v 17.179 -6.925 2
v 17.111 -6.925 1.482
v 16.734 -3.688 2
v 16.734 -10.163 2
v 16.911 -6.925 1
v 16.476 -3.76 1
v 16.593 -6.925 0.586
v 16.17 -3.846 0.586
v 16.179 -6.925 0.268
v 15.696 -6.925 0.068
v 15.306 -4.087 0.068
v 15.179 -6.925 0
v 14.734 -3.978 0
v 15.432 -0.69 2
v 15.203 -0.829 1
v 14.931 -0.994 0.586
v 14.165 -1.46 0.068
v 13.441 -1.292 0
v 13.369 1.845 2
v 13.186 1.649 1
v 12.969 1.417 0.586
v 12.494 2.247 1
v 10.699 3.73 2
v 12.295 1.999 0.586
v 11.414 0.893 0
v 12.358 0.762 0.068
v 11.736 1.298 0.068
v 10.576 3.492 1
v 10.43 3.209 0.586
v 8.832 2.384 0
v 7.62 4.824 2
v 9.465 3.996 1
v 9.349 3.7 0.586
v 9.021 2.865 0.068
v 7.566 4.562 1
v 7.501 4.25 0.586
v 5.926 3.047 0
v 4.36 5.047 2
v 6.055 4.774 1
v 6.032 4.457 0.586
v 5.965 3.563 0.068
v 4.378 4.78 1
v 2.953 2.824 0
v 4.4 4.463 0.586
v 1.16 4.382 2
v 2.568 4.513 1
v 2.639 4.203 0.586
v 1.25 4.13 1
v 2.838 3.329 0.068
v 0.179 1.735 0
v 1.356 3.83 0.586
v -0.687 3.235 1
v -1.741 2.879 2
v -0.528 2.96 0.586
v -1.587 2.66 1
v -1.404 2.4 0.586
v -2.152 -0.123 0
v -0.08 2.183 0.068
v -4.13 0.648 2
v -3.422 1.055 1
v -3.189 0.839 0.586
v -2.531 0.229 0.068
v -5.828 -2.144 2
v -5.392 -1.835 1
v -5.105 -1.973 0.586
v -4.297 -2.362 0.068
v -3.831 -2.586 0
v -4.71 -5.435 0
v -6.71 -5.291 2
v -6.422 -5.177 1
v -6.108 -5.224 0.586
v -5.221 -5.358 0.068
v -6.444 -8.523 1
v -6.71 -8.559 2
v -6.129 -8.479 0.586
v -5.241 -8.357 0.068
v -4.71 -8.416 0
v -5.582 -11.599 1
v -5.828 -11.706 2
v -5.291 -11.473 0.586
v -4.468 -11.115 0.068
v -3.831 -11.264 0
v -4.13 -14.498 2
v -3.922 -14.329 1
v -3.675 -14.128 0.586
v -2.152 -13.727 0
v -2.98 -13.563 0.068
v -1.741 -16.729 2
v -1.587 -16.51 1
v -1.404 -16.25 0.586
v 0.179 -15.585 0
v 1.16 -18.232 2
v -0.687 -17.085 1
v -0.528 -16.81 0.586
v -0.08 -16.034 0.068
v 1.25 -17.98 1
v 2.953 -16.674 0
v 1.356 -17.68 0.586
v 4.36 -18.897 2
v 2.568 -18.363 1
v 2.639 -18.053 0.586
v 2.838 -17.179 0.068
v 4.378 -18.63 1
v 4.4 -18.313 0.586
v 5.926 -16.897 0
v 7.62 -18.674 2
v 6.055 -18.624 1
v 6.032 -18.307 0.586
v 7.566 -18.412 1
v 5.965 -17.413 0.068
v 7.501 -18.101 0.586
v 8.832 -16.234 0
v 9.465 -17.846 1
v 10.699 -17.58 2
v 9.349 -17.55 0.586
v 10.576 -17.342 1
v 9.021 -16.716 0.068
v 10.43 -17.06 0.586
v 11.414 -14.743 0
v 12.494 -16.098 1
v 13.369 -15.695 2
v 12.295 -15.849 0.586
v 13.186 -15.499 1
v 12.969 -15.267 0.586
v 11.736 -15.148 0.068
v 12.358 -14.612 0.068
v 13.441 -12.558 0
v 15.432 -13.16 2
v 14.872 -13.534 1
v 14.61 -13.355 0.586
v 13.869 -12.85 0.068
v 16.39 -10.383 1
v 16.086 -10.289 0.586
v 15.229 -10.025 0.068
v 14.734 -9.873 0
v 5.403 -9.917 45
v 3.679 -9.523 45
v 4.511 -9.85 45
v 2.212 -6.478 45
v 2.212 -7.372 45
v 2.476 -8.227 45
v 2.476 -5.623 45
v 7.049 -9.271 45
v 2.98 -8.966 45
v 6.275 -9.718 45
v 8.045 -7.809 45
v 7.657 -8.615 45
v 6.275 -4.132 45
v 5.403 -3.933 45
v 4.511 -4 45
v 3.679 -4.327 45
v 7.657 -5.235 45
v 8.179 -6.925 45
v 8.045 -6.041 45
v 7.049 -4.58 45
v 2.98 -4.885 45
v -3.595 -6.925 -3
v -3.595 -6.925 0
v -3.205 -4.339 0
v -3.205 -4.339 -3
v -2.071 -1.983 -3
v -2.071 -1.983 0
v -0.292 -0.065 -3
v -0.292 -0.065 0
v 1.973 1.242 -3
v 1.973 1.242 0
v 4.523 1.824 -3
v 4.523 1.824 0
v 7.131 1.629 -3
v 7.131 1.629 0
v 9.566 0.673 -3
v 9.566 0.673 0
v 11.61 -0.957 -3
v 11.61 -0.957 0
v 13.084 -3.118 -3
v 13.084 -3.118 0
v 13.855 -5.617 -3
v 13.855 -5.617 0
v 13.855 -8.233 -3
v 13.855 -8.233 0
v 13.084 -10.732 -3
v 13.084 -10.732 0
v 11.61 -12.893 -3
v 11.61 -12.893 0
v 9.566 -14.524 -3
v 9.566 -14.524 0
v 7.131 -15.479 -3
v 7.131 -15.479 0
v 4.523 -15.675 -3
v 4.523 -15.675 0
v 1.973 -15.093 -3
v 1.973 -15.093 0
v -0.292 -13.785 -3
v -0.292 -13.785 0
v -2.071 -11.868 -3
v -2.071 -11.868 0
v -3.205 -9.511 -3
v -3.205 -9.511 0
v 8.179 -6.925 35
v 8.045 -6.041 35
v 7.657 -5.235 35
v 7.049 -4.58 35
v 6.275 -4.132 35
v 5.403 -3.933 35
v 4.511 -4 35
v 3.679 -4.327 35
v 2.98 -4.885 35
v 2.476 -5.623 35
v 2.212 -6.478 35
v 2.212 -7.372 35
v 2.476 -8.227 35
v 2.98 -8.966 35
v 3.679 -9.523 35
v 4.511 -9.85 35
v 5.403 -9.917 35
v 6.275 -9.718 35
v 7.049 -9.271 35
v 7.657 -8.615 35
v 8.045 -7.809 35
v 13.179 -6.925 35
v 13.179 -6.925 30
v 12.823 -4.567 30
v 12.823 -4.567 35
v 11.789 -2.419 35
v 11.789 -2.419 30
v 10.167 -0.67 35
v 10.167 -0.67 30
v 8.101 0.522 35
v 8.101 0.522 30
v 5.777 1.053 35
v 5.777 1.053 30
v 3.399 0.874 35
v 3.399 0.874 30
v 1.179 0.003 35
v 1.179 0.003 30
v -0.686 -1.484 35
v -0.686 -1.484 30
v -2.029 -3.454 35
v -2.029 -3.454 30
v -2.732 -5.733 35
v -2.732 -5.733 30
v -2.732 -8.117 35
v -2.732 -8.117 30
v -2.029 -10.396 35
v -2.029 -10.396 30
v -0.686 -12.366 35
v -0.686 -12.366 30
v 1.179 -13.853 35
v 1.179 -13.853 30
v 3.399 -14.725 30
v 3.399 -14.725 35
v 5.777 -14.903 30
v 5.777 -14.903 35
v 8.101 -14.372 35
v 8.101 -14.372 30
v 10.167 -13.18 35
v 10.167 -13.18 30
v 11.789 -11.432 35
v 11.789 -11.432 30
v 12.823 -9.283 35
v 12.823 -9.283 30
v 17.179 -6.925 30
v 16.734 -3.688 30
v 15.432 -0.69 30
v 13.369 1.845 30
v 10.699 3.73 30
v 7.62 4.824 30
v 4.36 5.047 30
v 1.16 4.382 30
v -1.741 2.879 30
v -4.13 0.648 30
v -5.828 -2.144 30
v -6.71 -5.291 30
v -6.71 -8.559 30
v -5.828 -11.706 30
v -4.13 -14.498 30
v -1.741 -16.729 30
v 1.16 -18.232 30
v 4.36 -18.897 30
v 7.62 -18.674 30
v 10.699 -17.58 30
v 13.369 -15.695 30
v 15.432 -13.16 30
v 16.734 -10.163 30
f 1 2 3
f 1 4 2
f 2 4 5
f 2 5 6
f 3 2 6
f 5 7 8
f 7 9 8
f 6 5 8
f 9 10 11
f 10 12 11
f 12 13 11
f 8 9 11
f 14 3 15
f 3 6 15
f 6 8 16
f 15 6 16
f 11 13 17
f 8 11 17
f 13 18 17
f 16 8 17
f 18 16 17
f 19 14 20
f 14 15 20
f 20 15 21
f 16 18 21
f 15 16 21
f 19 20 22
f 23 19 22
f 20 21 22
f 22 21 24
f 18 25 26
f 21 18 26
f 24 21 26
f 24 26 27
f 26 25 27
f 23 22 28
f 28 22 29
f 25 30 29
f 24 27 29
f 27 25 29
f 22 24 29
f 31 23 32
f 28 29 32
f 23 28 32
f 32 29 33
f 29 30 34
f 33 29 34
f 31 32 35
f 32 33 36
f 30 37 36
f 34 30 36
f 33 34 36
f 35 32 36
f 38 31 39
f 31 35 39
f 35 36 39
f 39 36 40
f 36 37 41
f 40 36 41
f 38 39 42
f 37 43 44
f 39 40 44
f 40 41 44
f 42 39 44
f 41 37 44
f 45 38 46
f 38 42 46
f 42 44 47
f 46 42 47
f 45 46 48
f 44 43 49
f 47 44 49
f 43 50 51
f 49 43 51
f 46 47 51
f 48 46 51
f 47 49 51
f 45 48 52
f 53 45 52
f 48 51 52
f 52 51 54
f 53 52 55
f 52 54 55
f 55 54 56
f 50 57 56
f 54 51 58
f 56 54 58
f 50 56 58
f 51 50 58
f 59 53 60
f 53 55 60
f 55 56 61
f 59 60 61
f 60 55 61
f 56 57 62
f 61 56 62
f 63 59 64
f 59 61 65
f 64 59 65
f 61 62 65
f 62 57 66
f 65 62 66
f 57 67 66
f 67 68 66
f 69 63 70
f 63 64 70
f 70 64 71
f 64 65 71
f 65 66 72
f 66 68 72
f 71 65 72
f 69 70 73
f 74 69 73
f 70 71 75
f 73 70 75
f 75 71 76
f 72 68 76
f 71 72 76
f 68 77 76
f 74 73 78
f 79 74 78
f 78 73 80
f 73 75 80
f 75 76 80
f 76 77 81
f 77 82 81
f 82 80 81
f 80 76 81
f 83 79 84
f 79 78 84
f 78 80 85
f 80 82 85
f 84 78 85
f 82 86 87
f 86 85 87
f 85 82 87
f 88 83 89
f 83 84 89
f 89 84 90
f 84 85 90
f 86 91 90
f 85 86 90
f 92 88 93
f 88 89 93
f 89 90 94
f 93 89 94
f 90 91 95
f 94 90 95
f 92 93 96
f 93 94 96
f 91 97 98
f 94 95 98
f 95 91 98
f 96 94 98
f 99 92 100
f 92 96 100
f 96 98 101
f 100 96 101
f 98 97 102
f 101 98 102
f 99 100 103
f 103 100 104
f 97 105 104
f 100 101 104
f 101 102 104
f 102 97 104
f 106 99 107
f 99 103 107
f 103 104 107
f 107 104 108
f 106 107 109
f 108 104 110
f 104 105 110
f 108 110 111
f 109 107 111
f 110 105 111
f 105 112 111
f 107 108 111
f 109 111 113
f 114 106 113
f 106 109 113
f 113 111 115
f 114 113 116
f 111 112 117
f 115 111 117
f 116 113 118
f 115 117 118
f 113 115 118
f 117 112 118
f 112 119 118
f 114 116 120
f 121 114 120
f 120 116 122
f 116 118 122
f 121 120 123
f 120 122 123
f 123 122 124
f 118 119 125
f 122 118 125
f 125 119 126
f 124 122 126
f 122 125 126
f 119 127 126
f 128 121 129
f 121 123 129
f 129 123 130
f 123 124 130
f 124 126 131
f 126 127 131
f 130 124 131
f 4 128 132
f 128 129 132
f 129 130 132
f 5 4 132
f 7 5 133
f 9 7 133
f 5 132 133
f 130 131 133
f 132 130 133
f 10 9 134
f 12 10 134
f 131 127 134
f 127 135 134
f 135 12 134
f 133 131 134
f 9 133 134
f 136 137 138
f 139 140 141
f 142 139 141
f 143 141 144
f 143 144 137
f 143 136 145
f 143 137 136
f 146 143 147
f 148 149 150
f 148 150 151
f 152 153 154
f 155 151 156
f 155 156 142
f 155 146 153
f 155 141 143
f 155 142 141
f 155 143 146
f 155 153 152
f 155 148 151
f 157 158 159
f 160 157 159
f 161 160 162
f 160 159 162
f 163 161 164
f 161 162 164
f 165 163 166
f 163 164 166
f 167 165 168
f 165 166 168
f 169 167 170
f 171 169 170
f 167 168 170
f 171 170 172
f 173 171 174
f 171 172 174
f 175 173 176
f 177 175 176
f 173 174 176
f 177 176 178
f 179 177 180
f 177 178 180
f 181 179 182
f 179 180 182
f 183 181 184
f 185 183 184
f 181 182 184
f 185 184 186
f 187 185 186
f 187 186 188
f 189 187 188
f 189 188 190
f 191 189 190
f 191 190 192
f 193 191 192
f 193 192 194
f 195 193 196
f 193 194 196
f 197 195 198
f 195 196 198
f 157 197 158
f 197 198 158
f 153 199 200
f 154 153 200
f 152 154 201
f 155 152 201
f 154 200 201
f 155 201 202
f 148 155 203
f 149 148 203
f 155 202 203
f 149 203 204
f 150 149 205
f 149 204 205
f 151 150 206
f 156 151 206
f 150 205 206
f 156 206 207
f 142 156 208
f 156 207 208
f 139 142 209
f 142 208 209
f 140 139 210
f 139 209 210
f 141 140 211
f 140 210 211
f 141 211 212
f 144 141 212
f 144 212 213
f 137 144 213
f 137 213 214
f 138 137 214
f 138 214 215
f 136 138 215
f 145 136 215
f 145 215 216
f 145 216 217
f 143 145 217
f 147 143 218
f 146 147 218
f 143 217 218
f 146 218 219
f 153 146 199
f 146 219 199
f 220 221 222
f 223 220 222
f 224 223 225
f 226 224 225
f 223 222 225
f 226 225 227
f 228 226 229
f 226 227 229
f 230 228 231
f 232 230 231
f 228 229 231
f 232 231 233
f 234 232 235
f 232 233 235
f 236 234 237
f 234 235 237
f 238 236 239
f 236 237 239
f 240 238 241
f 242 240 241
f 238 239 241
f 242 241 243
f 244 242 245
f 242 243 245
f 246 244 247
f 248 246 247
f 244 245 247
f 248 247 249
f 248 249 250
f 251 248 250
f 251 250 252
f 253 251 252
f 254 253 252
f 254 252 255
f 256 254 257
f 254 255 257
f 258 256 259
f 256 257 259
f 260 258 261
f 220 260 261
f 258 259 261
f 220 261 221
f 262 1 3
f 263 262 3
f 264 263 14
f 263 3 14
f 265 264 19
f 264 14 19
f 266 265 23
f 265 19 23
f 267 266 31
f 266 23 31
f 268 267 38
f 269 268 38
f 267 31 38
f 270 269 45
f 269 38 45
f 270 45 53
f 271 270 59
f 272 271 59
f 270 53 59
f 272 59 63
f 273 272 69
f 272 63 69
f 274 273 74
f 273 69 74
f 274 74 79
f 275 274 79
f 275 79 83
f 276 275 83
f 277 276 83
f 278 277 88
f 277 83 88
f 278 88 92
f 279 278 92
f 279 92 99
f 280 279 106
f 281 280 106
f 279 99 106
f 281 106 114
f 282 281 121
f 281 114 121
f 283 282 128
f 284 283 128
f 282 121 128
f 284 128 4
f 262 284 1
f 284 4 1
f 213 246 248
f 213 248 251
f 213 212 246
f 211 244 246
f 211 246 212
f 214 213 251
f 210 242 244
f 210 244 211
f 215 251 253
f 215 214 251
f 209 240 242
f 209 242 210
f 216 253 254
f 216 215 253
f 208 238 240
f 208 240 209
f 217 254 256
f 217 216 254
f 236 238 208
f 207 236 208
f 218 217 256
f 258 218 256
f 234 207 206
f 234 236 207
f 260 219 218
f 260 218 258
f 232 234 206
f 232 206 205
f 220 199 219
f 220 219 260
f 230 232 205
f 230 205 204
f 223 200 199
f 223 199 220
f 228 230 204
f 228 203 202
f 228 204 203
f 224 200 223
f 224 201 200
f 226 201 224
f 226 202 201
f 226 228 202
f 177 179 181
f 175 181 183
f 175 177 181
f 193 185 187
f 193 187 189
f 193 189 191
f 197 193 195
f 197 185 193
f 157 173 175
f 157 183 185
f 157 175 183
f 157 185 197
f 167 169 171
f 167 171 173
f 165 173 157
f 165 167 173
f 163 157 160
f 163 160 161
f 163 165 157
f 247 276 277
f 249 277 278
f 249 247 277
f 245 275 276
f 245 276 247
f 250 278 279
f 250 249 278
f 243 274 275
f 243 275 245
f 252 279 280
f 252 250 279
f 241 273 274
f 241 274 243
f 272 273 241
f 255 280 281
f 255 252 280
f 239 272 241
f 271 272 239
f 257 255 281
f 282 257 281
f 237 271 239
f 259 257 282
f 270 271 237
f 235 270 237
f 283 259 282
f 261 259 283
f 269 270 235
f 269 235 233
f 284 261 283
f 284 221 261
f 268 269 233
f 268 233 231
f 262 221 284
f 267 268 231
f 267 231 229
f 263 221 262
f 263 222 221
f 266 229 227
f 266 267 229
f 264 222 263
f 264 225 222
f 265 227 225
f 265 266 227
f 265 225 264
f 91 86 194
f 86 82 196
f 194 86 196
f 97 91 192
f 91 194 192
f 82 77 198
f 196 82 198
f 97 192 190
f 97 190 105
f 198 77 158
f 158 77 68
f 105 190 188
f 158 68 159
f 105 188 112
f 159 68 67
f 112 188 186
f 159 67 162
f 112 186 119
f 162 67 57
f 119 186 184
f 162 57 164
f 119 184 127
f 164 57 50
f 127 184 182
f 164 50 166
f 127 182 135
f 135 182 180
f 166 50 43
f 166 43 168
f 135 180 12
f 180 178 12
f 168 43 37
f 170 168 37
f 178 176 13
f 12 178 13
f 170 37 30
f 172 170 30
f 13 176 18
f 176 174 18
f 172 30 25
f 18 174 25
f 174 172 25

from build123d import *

# Parameters (mm, degrees)
SKETCH1_R           = 12
BOSS_EXTRUDE1_DEPTH = 30
SKETCH2_R           = 8
BOSS_EXTRUDE2_DEPTH = 5
SKETCH4_R           = 1.579295677
CUT_EXTRUDE3_DEPTH  = 3
SKETCH5_R           = 3
BOSS_EXTRUDE3_DEPTH = 10
SKETCH6_R           = 8.773986351
BOSS_EXTRUDE4_DEPTH = 3
FILLET1_R           = 2


with BuildPart() as part:
    # Sketch1 → Boss-Extrude1 (new body)
    with BuildSketch(Plane.XY):
        with Locations((5.178689325, -6.92509434)):
            Circle(SKETCH1_R)
    extrude(amount=BOSS_EXTRUDE1_DEPTH)

    # Sketch2 → Boss-Extrude2 (add)
    with BuildSketch(Plane.XY.offset(30)):
        with Locations((5.178689325, -6.92509434)):
            Circle(SKETCH2_R)
    extrude(amount=BOSS_EXTRUDE2_DEPTH)

    # Sketch4 → Cut-Extrude3 (cut)
    with BuildSketch(Plane.XY.offset(35)):
        with Locations((5.178689325, 2.995609984)):
            Circle(SKETCH4_R)
        with Locations((15.099393648, -6.92509434)):
            Circle(SKETCH4_R)
        with Locations((5.178689325, -16.845798663)):
            Circle(SKETCH4_R)
        with Locations((-4.742014998, -6.92509434)):
            Circle(SKETCH4_R)
    extrude(amount=-CUT_EXTRUDE3_DEPTH, mode=Mode.SUBTRACT)

    # Sketch5 → Boss-Extrude3 (add)
    with BuildSketch(Plane.XY.offset(35)):
        with Locations((5.178689325, -6.92509434)):
            Circle(SKETCH5_R)
    extrude(amount=BOSS_EXTRUDE3_DEPTH)

    # Sketch6 → Boss-Extrude4 (add)
    with BuildSketch(Plane(origin=(0, 0, 0), x_dir=(-1, 0, 0), z_dir=(0, 0, -1))):
        with Locations((-5.178689325, -6.92509434)):
            Circle(SKETCH6_R)
    extrude(amount=BOSS_EXTRUDE4_DEPTH)

    # Fillet1
    fillet1_edges = [part.edges().sort_by_distance(p)[0] for p in [
        (-6.821310675, -6.92509434, 0),
    ]]
    fillet(fillet1_edges, radius=FILLET1_R)


solid = part.part
